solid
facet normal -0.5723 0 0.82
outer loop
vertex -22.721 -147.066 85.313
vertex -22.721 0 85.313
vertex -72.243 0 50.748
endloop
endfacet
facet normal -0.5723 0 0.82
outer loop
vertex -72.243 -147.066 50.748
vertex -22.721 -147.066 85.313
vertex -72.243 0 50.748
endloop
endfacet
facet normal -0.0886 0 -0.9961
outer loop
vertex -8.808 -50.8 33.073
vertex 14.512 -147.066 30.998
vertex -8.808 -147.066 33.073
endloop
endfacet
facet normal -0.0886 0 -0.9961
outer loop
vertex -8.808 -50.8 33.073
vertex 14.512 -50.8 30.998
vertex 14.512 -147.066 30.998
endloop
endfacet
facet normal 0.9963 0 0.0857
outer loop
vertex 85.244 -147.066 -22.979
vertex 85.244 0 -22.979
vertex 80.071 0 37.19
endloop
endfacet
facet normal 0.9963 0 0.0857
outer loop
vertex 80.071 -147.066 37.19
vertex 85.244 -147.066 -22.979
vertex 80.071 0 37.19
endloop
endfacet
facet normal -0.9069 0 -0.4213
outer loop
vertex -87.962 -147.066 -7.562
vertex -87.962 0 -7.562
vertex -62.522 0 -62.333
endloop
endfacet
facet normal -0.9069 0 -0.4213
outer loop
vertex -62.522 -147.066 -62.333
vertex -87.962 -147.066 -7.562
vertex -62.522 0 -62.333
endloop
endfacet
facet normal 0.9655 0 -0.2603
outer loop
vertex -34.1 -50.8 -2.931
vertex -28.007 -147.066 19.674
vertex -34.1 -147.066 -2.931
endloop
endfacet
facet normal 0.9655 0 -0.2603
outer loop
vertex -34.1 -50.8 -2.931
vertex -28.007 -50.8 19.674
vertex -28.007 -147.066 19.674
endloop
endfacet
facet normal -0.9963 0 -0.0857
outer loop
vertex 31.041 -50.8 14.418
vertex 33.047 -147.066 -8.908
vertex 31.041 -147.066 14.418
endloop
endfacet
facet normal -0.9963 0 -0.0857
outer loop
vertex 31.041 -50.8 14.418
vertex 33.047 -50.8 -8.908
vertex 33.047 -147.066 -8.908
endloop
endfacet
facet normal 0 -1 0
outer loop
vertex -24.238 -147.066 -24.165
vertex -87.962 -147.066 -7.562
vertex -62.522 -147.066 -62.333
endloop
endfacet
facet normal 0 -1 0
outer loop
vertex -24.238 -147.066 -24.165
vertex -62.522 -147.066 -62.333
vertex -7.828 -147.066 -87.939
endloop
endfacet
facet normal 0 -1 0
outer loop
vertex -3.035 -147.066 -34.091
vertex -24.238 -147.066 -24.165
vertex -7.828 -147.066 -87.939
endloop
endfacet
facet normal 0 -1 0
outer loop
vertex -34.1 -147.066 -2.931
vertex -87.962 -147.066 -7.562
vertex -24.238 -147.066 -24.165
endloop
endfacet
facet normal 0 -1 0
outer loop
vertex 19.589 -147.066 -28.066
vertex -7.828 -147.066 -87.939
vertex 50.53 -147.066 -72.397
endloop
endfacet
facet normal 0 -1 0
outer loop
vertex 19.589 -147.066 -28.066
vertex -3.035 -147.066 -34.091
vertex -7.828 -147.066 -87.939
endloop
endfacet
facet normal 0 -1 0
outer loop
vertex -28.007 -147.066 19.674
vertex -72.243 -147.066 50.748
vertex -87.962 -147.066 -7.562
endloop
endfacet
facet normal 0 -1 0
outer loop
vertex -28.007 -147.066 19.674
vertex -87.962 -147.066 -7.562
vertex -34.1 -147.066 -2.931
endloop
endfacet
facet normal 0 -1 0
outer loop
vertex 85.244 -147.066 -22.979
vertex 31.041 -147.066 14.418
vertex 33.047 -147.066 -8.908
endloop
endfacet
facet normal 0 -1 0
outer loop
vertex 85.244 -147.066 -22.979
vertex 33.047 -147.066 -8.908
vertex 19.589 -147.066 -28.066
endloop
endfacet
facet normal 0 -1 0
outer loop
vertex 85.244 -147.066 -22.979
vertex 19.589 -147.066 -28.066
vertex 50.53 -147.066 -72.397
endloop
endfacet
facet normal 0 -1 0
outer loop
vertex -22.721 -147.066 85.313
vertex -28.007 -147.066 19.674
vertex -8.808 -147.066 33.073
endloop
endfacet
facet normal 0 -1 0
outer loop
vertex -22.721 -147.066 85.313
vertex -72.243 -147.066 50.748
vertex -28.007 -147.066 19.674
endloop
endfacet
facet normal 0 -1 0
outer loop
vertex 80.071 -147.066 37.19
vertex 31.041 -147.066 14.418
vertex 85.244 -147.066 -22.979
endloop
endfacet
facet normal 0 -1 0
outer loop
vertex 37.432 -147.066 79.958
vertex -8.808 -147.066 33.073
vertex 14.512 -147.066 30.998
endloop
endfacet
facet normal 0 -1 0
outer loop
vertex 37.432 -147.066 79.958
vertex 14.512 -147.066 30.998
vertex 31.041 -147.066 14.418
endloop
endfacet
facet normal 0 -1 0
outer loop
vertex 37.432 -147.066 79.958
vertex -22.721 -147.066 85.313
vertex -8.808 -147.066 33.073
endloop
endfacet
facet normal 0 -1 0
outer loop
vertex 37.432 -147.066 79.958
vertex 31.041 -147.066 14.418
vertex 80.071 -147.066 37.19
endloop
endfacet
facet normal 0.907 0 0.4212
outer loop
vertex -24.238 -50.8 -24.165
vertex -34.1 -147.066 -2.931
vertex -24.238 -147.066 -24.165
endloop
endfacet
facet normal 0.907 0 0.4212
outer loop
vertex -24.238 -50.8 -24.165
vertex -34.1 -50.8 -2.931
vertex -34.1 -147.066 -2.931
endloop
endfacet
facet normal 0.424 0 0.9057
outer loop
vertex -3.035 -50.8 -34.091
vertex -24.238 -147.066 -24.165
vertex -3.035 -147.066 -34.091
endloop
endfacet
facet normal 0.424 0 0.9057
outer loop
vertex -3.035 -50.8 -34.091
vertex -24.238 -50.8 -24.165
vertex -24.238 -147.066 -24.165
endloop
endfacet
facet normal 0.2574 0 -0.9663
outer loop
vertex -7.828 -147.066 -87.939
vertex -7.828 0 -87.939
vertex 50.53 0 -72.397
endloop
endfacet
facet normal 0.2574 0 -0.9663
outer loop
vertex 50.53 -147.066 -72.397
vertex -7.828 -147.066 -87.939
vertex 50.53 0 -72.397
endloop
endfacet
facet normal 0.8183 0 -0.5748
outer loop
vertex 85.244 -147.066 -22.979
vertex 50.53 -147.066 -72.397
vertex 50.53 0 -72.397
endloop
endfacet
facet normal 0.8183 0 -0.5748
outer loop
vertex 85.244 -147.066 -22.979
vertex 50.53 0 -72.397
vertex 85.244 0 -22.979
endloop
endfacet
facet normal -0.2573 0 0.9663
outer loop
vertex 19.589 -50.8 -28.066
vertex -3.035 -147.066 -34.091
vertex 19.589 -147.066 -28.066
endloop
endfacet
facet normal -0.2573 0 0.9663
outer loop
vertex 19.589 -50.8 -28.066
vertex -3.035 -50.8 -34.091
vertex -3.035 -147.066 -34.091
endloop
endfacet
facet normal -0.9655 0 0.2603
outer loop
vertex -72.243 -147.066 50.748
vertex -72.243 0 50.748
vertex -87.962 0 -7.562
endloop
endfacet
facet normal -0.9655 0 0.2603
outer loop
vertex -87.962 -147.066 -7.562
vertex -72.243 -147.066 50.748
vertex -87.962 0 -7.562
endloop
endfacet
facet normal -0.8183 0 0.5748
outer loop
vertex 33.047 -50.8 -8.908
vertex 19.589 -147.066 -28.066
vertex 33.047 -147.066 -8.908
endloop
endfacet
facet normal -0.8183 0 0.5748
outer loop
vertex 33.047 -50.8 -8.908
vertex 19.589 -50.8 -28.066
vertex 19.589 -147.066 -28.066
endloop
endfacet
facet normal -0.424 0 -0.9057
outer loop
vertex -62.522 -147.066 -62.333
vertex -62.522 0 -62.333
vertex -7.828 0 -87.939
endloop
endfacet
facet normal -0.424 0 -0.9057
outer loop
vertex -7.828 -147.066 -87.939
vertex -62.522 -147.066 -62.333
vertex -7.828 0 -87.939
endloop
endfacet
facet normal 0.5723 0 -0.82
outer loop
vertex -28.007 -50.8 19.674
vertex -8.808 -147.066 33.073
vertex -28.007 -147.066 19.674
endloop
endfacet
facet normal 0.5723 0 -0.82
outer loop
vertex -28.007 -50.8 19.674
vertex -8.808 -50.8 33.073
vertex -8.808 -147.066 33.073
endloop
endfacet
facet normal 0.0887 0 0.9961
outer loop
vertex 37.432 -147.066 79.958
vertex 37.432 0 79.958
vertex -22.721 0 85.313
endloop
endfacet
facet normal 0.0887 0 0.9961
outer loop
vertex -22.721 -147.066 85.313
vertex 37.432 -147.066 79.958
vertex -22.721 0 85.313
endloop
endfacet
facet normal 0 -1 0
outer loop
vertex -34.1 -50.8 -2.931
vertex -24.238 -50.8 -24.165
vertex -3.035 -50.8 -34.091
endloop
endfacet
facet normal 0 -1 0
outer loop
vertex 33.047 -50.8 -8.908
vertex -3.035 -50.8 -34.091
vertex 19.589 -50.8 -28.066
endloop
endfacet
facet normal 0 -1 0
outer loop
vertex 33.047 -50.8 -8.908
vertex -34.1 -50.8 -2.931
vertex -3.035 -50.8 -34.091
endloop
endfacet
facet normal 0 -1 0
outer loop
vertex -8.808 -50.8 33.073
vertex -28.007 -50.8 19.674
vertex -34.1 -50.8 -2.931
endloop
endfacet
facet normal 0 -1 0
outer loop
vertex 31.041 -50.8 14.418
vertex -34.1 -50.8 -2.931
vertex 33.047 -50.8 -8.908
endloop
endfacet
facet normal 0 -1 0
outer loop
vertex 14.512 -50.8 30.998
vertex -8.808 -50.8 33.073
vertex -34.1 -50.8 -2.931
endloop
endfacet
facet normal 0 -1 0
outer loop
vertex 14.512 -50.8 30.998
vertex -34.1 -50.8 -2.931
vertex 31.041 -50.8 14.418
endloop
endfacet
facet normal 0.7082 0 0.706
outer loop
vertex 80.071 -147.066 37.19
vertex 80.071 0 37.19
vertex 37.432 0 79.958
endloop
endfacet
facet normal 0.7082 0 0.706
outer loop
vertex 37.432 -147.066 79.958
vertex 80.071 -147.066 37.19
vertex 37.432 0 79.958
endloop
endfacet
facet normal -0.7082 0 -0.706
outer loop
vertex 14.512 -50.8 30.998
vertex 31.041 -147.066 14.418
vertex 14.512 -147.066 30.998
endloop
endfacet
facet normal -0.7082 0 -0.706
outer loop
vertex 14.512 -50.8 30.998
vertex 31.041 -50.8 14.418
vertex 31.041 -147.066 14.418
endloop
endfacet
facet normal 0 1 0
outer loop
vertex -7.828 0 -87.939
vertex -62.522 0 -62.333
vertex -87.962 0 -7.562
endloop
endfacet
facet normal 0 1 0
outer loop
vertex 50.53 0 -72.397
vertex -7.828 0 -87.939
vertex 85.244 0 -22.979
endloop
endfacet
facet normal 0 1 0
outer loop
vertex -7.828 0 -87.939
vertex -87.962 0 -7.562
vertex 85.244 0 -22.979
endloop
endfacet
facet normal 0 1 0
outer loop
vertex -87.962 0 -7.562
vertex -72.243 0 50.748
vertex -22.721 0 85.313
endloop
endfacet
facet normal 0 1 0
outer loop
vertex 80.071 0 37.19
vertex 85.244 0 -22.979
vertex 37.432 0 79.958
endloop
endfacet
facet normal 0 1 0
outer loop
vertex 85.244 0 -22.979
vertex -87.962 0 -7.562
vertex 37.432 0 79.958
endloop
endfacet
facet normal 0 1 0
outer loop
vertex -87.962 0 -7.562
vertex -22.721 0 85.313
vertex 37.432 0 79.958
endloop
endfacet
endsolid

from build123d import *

# Parameters (mm, degrees)
F1_DEPTH = 147.066
F2_T     = -50.8


with BuildPart() as f1:
    # F0 (on Front) → F1 (new body)
    with BuildSketch(Plane.XZ):
        Polygon((-87.962036, -7.561638), (-62.522302, -62.333458), (-7.827687, -87.93876), (50.529589, -72.396539), (85.243509, -22.979173), (80.071044, 37.190404), (37.432448, 79.958177), (-22.721207, 85.312631), (-72.243357, 50.748356), align=None)
    extrude(amount=F1_DEPTH)

    # F2
    f2_openings = [f1.faces().sort_by_distance(p)[0] for p in [
        (0, -147.066, 0),
    ]]
    offset(amount=F2_T, openings=f2_openings)


solid = f1.part
